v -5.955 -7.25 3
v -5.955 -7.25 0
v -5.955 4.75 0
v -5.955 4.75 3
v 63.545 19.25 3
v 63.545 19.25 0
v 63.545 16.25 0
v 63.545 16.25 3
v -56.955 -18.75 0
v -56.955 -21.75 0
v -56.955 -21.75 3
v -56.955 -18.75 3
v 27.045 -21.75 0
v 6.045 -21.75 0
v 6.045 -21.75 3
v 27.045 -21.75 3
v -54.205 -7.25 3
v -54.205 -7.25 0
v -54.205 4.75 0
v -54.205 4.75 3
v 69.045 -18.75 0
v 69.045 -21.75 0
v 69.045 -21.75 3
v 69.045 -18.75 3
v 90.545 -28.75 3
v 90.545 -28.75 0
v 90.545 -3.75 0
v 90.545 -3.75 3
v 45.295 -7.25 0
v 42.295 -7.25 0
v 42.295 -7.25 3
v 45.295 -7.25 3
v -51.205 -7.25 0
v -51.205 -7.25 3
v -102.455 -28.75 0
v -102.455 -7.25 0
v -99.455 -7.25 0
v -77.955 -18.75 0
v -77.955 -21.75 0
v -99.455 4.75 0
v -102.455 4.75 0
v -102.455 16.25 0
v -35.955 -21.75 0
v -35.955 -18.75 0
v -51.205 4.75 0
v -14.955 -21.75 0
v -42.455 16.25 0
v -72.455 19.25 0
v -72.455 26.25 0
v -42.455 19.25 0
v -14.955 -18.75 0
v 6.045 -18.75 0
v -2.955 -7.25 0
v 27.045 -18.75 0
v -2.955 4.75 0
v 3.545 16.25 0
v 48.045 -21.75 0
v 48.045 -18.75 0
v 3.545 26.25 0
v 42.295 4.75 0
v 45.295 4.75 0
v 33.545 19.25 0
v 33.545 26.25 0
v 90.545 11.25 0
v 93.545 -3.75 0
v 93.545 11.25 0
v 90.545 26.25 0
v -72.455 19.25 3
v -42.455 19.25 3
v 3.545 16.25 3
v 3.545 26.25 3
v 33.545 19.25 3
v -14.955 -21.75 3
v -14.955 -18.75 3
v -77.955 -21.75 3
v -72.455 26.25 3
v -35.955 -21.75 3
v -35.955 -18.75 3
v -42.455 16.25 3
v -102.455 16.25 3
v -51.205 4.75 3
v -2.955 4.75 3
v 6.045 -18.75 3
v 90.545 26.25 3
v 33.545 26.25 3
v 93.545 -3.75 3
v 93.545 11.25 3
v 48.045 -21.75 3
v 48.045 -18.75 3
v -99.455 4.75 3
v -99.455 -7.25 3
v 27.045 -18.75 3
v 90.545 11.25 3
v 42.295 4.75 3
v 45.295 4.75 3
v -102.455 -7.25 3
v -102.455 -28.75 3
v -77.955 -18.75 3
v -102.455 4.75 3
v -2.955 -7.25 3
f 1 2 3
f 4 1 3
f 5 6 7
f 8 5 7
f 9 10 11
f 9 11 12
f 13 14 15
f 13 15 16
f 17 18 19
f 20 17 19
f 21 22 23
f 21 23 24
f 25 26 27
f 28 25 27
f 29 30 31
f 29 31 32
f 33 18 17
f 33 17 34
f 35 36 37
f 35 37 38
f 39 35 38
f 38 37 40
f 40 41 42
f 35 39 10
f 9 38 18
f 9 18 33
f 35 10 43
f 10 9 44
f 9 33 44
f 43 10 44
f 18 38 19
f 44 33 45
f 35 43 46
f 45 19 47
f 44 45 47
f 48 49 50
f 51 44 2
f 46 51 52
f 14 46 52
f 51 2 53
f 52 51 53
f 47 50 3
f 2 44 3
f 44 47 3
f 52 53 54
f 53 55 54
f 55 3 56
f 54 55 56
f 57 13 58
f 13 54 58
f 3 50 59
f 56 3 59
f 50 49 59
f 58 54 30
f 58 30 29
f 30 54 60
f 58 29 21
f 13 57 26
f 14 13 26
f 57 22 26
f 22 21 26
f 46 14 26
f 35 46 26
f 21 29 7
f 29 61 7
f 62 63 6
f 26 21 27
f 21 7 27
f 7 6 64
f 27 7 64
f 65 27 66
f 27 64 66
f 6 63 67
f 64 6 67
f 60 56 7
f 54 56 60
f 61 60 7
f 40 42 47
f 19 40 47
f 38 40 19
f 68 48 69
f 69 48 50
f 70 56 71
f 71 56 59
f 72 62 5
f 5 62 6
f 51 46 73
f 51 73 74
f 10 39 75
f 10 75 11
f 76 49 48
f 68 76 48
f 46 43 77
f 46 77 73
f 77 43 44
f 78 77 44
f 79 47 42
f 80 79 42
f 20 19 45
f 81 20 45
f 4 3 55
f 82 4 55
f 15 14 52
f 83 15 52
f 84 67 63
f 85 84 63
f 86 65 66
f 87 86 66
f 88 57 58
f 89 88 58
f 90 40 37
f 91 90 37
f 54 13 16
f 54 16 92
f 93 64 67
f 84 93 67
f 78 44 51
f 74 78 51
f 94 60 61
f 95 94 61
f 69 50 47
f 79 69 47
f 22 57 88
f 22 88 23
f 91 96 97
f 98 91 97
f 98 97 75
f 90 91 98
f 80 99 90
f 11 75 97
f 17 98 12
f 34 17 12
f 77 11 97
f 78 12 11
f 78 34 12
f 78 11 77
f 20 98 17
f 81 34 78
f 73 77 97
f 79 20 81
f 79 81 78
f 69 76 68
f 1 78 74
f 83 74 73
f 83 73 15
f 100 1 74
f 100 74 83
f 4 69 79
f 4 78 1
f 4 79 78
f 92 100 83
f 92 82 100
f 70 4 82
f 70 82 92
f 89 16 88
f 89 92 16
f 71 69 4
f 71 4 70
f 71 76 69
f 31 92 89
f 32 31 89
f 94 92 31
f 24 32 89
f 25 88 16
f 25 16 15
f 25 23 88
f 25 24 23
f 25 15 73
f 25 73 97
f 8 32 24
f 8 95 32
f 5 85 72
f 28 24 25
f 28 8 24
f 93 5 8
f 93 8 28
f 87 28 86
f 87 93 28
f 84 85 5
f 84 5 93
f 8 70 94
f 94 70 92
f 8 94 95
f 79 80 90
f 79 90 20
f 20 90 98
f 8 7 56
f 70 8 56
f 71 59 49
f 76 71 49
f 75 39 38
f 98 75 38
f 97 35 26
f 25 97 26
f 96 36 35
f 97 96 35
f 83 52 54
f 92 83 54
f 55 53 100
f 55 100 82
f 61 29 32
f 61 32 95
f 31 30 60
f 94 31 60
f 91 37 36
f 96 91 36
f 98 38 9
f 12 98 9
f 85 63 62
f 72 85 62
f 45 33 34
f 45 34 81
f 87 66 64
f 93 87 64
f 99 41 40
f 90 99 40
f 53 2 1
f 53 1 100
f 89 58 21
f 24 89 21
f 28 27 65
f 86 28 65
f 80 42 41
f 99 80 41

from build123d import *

# Parameters (mm, degrees)
SKETCH1_W           = 21
SKETCH1_H           = 3
SKETCH1_W_2         = 3
SKETCH1_H_2         = 12
BOSS_EXTRUDE1_DEPTH = 3


with BuildPart() as part:
    # Sketch1 → Boss-Extrude1 (new body)
    with BuildSketch(Plane.XY):
        Polygon((-99.454545455, -7.25), (-102.454545455, -7.25), (-102.454545455, -28.75), (90.545454545, -28.75), (90.545454545, -3.75), (93.545454545, -3.75), (93.545454545, 11.25), (90.545454545, 11.25), (90.545454545, 26.25), (33.545454545, 26.25), (33.545454545, 19.25), (63.545454545, 19.25), (63.545454545, 16.25), (3.545454545, 16.25), (3.545454545, 26.25), (-72.454545455, 26.25), (-72.454545455, 19.25), (-42.454545455, 19.25), (-42.454545455, 16.25), (-102.454545455, 16.25), (-102.454545455, 4.75), (-99.454545455, 4.75), align=None)
        with Locations((-67.454545455, -20.25)):
            Rectangle(SKETCH1_W, SKETCH1_H, mode=Mode.SUBTRACT)
        with Locations((-25.454545455, -20.25)):
            Rectangle(SKETCH1_W, SKETCH1_H, mode=Mode.SUBTRACT)
        with Locations((16.545454545, -20.25)):
            Rectangle(SKETCH1_W, SKETCH1_H, mode=Mode.SUBTRACT)
        with Locations((58.545454545, -20.25)):
            Rectangle(SKETCH1_W, SKETCH1_H, mode=Mode.SUBTRACT)
        with Locations((-52.704545455, -1.25)):
            Rectangle(SKETCH1_W_2, SKETCH1_H_2, mode=Mode.SUBTRACT)
        with Locations((-4.454545455, -1.25)):
            Rectangle(SKETCH1_W_2, SKETCH1_H_2, mode=Mode.SUBTRACT)
        with Locations((43.795454545, -1.25)):
            Rectangle(SKETCH1_W_2, SKETCH1_H_2, mode=Mode.SUBTRACT)
    extrude(amount=BOSS_EXTRUDE1_DEPTH)


solid = part.part
